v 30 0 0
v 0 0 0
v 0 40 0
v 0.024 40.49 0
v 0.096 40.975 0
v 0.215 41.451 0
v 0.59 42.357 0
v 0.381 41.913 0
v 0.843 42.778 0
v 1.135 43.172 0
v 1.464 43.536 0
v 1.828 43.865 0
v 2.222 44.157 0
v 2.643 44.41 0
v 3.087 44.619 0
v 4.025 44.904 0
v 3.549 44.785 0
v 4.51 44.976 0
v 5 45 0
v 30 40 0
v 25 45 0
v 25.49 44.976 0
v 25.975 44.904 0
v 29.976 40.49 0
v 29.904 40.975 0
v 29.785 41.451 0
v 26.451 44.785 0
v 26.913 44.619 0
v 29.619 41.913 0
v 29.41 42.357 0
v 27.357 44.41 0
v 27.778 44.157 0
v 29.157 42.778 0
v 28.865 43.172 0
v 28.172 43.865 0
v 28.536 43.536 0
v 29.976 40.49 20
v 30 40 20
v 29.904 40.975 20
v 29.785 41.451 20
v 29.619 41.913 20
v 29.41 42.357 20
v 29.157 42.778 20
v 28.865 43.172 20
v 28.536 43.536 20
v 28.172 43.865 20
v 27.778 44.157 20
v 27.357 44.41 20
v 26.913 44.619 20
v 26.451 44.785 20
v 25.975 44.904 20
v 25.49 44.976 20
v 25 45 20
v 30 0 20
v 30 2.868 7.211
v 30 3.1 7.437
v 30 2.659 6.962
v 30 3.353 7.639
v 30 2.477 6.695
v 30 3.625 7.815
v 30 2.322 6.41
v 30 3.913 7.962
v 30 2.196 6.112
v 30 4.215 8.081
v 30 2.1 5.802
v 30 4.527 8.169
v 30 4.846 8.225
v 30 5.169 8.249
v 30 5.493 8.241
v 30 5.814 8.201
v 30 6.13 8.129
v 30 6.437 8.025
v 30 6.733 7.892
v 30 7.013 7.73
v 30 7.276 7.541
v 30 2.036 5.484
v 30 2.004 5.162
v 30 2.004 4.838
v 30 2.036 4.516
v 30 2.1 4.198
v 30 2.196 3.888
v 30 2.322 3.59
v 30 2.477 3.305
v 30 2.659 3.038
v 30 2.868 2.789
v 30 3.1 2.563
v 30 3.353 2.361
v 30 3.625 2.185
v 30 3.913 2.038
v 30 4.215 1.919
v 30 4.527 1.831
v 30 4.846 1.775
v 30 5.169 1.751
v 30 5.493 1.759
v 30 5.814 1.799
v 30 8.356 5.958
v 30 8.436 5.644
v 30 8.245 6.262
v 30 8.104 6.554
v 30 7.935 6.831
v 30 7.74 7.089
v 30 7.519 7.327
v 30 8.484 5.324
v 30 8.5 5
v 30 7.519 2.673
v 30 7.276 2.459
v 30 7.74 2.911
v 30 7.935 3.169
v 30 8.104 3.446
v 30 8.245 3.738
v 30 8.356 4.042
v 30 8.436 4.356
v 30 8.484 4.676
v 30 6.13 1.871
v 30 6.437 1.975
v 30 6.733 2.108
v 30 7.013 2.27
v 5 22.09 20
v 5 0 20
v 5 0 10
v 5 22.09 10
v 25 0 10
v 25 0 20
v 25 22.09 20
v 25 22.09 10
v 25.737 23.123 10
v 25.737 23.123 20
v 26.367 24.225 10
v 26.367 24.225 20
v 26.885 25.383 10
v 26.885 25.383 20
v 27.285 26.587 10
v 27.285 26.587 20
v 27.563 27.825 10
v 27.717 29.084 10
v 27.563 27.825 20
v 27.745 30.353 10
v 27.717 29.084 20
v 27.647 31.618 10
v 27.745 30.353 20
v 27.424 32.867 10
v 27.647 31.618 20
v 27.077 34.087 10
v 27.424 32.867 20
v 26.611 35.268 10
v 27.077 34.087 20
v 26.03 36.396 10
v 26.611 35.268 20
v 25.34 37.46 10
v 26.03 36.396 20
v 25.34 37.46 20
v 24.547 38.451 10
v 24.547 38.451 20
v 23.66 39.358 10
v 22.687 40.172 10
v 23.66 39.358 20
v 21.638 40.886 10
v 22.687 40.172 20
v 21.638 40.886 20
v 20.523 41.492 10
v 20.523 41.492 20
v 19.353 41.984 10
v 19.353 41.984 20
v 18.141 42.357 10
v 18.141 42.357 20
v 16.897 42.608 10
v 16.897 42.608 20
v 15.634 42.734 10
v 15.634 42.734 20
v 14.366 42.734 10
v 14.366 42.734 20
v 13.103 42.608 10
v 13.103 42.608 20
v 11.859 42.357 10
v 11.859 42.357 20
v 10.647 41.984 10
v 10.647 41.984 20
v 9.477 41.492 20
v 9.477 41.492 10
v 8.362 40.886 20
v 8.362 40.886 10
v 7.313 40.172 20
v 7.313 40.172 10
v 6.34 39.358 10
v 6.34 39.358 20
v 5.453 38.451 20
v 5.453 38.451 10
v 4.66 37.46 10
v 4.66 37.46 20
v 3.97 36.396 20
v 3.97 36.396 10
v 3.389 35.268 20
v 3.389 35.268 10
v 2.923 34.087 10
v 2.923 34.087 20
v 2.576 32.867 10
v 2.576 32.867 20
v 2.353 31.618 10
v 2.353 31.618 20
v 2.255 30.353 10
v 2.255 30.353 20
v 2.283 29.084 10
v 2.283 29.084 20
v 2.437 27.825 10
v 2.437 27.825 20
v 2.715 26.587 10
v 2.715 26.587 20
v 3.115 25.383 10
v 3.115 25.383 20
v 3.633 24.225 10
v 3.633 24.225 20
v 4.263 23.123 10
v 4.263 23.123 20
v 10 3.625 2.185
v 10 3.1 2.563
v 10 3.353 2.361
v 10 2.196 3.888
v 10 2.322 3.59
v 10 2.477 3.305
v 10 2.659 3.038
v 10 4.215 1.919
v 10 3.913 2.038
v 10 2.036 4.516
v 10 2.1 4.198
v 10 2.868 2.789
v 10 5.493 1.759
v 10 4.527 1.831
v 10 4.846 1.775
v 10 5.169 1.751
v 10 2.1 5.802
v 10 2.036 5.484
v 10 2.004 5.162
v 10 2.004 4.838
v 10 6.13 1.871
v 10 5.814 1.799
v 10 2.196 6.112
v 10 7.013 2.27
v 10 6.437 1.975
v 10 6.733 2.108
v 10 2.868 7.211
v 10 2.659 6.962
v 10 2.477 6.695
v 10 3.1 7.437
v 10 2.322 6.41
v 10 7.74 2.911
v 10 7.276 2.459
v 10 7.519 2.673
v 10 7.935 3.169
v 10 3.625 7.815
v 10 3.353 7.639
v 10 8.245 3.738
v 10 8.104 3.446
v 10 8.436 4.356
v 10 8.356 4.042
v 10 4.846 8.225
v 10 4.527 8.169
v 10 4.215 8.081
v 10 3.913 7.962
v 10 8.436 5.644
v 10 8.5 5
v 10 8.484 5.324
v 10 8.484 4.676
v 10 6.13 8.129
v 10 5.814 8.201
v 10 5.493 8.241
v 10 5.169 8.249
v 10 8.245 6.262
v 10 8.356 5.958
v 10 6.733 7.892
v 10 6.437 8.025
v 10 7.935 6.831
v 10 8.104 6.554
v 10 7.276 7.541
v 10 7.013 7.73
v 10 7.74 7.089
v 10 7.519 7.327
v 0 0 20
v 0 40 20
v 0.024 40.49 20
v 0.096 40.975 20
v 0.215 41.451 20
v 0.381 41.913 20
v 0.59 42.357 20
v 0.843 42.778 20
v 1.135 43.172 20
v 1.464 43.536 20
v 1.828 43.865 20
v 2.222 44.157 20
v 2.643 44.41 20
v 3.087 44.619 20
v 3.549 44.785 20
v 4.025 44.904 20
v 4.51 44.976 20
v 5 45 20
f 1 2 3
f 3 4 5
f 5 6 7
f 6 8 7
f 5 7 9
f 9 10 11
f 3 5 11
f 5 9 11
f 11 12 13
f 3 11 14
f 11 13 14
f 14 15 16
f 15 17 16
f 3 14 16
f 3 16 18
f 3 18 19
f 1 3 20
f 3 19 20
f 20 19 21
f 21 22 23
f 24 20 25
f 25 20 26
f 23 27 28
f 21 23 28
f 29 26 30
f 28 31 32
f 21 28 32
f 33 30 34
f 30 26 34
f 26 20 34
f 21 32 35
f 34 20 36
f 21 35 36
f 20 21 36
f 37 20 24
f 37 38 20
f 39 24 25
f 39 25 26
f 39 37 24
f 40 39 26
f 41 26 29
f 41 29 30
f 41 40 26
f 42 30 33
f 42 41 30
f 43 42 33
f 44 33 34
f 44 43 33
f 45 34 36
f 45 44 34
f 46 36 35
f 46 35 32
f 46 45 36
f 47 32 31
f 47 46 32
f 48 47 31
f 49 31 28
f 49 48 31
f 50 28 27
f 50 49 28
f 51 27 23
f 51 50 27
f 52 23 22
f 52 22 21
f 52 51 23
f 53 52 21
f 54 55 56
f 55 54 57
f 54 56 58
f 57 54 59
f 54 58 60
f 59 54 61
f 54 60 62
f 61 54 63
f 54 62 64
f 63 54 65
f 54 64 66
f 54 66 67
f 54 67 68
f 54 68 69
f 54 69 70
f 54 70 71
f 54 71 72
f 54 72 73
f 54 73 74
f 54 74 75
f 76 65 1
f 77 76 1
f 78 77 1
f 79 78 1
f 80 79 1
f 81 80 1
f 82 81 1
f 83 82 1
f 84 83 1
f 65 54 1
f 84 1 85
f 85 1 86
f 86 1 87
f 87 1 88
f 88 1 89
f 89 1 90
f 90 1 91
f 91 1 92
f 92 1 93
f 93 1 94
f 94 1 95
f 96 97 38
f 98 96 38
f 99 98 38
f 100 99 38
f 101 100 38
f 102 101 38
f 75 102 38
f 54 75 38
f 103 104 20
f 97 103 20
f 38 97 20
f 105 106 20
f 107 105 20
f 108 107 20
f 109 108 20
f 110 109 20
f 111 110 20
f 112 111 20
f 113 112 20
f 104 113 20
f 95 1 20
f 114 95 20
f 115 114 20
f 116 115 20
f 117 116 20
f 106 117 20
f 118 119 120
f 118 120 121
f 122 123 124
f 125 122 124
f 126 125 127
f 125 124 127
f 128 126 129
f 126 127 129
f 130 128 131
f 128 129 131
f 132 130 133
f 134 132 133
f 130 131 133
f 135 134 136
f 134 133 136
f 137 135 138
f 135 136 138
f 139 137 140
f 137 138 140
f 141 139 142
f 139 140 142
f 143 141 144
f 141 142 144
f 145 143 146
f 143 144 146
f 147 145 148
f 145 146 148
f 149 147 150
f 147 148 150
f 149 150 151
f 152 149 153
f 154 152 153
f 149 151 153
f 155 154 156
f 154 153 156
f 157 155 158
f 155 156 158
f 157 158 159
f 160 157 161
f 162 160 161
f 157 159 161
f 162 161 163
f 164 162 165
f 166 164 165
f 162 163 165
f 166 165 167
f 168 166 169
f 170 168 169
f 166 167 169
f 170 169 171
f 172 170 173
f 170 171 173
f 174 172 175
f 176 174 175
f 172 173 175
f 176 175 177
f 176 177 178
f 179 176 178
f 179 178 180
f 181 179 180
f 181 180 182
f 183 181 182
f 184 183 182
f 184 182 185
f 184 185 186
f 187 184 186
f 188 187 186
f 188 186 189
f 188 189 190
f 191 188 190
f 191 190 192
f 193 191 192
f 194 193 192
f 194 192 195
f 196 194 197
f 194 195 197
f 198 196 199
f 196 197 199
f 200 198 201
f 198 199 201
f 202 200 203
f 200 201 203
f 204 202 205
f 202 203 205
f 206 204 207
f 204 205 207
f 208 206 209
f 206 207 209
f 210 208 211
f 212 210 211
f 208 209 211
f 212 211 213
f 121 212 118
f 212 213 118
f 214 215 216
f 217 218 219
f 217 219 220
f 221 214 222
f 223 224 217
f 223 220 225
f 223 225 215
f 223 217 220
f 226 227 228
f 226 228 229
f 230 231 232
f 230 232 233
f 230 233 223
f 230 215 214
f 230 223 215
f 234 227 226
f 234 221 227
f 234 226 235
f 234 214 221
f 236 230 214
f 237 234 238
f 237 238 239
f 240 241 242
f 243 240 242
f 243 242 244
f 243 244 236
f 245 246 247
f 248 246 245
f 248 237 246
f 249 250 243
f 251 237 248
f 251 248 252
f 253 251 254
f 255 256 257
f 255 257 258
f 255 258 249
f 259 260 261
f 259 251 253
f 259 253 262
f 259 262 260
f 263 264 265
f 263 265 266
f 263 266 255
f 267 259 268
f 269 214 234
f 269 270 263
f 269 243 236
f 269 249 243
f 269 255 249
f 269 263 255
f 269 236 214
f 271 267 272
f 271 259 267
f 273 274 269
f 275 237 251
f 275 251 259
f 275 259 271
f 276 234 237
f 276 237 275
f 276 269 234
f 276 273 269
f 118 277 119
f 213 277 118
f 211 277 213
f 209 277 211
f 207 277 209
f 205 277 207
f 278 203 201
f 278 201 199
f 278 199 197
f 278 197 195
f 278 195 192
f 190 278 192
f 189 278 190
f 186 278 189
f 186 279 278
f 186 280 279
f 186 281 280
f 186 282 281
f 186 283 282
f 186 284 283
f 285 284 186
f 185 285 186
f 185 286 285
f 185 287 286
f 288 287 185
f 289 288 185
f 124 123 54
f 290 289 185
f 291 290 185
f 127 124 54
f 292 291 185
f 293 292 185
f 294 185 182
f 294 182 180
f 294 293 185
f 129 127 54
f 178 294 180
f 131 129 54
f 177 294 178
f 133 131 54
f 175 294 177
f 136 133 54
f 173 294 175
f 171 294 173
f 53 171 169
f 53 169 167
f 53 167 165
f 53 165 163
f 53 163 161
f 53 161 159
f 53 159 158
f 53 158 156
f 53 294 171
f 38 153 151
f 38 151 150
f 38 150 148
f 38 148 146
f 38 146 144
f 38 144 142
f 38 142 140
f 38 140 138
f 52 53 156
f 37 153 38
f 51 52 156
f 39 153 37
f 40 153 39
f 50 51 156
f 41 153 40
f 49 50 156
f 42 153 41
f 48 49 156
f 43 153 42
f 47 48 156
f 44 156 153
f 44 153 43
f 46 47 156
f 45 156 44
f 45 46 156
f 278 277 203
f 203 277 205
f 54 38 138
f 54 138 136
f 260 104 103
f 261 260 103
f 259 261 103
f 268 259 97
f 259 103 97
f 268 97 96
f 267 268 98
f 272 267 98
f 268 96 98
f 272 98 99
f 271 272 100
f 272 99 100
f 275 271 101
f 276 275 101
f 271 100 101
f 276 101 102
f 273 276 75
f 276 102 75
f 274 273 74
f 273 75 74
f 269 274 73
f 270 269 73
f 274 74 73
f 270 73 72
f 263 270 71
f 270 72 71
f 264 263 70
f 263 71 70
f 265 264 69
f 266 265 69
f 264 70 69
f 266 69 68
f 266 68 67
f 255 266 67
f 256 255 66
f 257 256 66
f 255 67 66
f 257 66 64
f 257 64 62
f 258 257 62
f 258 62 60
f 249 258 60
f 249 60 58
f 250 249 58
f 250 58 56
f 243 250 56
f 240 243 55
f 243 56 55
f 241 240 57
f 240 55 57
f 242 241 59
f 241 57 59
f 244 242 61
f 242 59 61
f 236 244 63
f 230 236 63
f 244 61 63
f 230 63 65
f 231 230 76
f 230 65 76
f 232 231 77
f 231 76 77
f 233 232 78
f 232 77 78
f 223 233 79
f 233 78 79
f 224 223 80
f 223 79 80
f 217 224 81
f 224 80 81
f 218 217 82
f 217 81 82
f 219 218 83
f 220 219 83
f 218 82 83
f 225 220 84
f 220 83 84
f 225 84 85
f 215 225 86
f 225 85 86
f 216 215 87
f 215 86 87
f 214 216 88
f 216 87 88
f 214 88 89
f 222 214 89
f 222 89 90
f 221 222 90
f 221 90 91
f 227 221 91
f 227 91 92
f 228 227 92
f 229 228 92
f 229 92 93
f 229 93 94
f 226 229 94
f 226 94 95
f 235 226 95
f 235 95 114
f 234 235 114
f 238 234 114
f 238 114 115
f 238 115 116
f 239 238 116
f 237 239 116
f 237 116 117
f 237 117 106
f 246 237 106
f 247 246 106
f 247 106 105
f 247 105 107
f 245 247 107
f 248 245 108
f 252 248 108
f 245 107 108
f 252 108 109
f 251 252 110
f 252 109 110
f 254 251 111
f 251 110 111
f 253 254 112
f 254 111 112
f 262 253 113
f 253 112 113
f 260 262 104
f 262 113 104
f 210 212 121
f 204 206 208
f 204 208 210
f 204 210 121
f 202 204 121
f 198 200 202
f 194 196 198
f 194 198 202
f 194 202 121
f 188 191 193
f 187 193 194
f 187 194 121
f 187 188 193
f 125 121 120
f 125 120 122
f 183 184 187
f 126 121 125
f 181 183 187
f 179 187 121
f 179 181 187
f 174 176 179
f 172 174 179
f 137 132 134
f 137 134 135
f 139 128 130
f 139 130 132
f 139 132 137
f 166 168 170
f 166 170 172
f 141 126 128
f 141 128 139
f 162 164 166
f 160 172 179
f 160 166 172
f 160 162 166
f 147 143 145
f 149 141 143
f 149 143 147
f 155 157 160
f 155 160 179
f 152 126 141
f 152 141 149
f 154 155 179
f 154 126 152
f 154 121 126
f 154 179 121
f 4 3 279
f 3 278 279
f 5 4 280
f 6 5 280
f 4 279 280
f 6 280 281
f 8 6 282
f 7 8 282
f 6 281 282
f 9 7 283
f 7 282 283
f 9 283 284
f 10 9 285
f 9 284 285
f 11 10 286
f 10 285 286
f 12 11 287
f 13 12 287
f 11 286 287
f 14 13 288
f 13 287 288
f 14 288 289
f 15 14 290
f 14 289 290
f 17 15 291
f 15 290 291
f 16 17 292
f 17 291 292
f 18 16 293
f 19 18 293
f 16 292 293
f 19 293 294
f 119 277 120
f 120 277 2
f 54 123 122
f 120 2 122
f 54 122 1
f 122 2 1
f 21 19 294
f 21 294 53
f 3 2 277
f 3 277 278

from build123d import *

# Parameters (mm, degrees)
F0_W     = 29.999999
F0_H     = 45
F1_DEPTH = 20
F2_R     = 12.75
F3_DEPTH = 10
F4_R     = 3.25
F5_DEPTH = 20
F6_W     = 20
F6_H     = 22.090354
F7_DEPTH = 10
F8_R     = 5


with BuildPart() as f1:
    # F0 (on Top) → F1 (new body)
    with BuildSketch(Plane.XY):
        with Locations((14.999999, 22.5)):
            Rectangle(F0_W, F0_H)
    extrude(amount=F1_DEPTH)

    # F2 (on face) → F3 (cut)
    with BuildSketch(Plane.XY.offset(20)):
        with Locations((14.999999, 30)):
            Circle(F2_R)
    extrude(amount=-F3_DEPTH, mode=Mode.SUBTRACT)

    # F4 (on face) → F5 (cut)
    with BuildSketch(Plane.YZ.offset(29.999999)):
        with Locations((5.25, 5)):
            Circle(F4_R)
    extrude(amount=-F5_DEPTH, mode=Mode.SUBTRACT)

    # F6 (on face) → F7 (cut)
    with BuildSketch(Plane.XY.offset(20)):
        with Locations((14.999999, 11.045177)):
            Rectangle(F6_W, F6_H)
    extrude(amount=-F7_DEPTH, mode=Mode.SUBTRACT)

    # F8
    f8_edges = [f1.edges().sort_by_distance(p)[0] for p in [
        (0, 45, 10),
        (29.999999, 45, 10),
    ]]
    fillet(f8_edges, radius=F8_R)


solid = f1.part
